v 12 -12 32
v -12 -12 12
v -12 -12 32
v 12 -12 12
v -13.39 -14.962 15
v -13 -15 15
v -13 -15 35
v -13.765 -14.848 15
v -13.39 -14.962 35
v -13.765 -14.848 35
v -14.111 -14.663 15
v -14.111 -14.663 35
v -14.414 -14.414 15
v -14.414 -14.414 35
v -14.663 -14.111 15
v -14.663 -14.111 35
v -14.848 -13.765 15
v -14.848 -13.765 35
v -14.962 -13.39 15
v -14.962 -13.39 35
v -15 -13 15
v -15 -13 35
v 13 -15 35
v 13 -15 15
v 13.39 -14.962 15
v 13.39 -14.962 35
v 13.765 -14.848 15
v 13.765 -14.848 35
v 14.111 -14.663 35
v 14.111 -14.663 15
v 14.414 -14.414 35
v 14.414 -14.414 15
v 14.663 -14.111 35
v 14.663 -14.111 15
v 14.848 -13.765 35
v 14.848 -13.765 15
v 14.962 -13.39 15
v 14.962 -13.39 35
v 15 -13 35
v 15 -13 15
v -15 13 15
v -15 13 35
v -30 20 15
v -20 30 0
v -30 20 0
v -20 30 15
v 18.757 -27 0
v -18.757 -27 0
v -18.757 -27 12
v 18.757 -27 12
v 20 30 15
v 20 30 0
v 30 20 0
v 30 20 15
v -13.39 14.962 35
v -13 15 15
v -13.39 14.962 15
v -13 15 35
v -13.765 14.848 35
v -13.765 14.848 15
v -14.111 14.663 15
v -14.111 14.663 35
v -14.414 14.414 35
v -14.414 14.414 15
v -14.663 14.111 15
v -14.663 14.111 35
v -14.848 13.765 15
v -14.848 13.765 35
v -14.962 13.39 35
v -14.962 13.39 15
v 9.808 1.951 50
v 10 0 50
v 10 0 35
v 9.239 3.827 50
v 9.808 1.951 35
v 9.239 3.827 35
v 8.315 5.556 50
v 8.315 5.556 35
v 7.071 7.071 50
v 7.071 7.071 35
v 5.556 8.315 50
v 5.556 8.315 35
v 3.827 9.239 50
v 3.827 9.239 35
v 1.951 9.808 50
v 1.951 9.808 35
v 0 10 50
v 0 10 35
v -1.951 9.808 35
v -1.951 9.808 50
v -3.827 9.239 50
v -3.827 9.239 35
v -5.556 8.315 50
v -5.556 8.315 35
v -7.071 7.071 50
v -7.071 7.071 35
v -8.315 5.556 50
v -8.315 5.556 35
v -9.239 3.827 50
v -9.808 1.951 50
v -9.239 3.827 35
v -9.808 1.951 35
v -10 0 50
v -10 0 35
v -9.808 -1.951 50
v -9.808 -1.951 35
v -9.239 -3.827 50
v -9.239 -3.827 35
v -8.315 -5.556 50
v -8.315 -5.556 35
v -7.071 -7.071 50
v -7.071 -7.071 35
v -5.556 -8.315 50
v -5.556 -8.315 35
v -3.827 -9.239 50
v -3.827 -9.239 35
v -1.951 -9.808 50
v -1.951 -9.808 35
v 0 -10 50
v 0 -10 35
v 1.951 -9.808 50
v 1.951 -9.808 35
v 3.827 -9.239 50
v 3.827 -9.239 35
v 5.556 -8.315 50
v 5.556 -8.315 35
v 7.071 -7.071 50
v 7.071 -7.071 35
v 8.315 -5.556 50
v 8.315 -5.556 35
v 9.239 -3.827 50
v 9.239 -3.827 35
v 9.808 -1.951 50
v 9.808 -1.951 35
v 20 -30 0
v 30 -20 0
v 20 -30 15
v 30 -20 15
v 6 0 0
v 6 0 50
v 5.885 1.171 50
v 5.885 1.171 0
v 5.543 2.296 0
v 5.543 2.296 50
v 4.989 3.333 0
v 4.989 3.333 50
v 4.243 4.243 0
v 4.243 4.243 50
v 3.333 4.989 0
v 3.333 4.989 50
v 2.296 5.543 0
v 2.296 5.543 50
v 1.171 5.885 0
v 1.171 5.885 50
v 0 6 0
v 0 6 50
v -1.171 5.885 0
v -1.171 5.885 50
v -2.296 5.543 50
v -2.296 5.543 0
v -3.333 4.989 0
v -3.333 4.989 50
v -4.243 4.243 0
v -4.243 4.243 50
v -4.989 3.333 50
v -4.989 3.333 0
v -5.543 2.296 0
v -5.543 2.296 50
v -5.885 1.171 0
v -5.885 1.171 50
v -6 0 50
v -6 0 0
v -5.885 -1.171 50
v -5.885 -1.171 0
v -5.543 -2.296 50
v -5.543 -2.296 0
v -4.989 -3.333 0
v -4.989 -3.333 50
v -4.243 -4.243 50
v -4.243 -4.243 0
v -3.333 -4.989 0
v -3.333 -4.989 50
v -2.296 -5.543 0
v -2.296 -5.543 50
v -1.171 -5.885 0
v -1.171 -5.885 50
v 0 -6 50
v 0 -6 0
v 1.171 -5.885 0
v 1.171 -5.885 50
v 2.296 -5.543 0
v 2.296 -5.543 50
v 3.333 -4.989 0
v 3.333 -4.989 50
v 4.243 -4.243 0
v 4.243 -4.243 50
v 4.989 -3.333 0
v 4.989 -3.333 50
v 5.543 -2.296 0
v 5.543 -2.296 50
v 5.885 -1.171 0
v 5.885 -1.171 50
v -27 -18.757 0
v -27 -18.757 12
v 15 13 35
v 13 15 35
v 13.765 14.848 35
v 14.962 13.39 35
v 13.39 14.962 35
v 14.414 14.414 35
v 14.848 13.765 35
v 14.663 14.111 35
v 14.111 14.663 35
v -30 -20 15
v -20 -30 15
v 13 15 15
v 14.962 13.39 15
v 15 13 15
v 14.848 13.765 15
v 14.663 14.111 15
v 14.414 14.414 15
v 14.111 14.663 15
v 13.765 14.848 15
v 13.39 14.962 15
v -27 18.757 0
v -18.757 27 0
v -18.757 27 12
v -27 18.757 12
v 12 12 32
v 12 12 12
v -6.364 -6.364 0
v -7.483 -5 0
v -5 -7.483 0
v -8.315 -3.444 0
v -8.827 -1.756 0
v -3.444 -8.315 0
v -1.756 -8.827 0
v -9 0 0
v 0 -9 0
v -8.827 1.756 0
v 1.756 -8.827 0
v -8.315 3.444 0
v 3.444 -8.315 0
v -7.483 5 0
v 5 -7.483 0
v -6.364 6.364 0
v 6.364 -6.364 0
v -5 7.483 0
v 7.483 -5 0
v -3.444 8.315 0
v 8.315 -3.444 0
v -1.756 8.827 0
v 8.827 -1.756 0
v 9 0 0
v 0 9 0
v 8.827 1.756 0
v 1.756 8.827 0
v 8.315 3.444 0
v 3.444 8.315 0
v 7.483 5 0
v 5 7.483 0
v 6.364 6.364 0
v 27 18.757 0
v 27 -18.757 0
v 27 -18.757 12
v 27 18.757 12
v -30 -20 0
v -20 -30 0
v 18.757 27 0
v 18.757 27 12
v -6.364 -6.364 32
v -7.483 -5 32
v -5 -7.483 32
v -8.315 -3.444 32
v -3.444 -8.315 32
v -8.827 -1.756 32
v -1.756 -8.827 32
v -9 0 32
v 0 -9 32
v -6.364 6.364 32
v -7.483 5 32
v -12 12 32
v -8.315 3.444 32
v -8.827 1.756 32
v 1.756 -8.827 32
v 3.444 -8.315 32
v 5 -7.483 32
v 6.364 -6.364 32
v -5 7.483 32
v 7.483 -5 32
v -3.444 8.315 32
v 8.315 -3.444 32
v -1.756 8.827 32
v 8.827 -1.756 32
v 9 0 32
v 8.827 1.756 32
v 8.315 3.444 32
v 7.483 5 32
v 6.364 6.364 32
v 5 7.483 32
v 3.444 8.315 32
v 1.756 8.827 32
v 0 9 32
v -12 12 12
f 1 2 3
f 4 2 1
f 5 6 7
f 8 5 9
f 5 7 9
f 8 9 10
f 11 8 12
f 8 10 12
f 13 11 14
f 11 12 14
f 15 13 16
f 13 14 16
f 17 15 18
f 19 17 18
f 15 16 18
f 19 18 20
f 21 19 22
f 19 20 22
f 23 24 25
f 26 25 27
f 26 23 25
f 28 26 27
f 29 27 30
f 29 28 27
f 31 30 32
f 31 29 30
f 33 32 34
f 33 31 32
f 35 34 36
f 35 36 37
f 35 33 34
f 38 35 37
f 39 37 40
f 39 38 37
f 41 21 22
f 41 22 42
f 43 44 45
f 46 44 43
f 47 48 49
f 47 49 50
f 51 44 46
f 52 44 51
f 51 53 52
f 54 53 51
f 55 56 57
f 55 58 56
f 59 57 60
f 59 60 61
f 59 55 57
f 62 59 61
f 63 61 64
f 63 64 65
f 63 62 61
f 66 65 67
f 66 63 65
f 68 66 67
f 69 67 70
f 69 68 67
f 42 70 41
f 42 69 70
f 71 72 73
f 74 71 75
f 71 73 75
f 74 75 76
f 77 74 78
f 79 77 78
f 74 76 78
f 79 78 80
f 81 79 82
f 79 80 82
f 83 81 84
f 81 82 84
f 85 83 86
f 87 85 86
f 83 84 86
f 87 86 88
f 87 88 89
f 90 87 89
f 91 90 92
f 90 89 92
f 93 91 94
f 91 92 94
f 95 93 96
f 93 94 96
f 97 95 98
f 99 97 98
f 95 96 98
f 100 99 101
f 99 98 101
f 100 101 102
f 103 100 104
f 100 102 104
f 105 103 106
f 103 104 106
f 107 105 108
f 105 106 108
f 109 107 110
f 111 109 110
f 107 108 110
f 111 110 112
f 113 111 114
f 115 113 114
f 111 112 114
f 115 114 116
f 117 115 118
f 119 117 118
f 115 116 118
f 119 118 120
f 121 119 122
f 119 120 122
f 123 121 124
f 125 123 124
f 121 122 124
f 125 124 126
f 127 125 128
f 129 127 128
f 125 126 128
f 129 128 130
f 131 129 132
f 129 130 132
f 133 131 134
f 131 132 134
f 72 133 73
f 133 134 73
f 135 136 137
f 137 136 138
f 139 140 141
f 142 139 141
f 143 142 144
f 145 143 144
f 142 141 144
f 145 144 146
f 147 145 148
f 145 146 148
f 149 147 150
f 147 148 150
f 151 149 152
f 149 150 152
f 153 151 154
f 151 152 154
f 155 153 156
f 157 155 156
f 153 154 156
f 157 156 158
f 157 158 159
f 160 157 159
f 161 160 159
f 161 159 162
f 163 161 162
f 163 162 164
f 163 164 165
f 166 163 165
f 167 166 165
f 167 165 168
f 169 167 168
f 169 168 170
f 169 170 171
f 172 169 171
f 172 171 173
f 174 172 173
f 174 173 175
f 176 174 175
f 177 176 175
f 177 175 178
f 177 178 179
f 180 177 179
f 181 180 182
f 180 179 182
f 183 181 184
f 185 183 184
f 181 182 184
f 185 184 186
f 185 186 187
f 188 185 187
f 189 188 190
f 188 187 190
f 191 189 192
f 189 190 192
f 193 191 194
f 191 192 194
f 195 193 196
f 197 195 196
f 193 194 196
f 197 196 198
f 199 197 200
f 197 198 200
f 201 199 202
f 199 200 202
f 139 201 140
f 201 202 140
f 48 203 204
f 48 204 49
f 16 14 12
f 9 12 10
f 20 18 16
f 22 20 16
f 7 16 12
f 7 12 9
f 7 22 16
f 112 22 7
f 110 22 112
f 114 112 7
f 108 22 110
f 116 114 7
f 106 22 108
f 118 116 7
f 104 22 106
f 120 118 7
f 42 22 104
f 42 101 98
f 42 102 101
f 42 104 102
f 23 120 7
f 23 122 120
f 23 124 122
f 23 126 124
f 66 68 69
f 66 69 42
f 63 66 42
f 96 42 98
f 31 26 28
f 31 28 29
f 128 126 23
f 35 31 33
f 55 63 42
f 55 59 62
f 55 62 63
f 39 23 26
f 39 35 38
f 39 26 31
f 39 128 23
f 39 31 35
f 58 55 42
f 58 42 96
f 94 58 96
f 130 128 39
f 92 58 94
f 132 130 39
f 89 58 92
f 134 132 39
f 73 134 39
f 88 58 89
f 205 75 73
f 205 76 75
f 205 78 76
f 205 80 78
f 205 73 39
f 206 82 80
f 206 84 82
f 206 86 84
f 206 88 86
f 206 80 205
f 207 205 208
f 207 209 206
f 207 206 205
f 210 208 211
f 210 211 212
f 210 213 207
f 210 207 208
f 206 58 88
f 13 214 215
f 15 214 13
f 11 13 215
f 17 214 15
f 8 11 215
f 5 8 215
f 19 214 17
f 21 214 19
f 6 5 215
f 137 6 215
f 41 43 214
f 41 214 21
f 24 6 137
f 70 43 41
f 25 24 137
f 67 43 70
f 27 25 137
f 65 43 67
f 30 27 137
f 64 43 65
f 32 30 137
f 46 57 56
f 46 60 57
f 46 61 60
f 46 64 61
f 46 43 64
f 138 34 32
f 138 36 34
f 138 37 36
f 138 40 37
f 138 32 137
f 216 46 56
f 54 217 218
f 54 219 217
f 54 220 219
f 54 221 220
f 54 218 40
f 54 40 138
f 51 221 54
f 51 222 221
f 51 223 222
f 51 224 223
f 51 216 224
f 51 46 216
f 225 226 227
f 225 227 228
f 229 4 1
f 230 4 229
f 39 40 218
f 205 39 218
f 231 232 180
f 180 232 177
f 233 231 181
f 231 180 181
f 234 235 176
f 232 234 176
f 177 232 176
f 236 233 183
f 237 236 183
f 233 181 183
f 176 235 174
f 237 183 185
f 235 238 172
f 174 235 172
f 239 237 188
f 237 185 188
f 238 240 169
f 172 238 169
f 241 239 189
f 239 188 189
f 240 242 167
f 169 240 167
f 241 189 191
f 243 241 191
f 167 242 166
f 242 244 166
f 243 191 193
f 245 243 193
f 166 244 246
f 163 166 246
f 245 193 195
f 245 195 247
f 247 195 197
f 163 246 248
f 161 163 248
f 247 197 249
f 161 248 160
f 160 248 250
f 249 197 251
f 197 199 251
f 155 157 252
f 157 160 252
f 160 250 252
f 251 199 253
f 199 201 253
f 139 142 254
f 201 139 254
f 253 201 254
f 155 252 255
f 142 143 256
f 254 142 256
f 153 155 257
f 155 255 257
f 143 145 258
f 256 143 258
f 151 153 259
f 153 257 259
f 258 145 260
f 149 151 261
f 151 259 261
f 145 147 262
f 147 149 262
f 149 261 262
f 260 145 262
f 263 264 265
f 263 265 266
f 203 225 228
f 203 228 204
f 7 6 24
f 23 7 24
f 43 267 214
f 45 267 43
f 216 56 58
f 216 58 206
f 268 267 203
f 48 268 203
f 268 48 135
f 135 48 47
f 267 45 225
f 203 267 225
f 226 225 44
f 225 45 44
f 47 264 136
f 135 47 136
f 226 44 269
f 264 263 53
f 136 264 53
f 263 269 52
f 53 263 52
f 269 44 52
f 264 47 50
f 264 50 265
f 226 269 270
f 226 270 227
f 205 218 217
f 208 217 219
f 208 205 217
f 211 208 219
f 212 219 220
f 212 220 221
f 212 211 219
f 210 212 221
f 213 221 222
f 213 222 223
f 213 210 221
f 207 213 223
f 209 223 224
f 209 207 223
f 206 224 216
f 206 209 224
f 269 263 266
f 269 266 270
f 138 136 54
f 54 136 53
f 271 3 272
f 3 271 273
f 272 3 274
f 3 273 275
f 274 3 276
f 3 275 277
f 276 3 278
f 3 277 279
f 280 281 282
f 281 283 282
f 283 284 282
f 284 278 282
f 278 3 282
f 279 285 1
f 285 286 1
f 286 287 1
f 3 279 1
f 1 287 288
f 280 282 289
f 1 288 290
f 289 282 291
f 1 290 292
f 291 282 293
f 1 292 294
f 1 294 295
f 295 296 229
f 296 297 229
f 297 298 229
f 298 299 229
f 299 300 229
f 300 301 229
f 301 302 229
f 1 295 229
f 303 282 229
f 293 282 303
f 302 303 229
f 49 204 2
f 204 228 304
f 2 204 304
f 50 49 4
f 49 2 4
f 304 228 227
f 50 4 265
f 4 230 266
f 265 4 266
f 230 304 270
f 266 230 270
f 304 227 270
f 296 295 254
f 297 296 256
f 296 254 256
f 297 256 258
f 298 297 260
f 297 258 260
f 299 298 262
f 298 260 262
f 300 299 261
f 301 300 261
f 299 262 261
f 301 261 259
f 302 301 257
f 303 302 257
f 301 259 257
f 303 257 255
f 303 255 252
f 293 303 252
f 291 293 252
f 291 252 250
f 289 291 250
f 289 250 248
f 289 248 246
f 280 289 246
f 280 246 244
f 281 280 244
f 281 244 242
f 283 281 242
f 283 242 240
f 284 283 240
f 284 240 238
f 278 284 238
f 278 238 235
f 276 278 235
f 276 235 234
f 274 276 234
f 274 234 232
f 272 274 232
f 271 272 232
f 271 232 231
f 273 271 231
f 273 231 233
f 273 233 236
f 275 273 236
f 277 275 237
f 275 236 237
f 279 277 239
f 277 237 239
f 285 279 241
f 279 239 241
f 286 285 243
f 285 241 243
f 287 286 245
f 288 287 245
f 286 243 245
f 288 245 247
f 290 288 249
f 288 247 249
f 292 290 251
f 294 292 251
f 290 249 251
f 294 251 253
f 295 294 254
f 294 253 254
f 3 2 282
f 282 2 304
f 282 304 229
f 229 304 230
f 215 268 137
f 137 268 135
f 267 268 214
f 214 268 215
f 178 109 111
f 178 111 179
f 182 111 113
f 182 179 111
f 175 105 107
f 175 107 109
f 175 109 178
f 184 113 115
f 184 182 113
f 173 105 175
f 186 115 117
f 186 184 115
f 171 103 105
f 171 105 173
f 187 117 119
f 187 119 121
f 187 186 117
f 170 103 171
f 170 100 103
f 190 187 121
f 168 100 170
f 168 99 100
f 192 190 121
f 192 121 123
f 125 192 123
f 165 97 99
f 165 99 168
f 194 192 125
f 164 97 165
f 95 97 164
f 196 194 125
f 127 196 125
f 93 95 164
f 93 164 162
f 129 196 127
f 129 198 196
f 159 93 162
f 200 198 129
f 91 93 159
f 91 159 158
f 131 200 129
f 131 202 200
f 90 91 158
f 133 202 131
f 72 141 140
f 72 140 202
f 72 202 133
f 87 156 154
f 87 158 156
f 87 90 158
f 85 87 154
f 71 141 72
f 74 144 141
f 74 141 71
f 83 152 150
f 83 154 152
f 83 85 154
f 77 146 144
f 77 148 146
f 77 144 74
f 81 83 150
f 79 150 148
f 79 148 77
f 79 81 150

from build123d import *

# Parameters (mm, degrees)
SKETCH1_W           = 60
SKETCH1_H           = 60
BOSS_EXTRUDE1_DEPTH = 15
SKETCH2_W           = 30
SKETCH2_H           = 30
BOSS_EXTRUDE2_DEPTH = 20
SKETCH3_R           = 10
BOSS_EXTRUDE3_DEPTH = 15
SKETCH4_R           = 6
CUT_EXTRUDE1_DEPTH  = 66.574385243
CHAMFER1_SIZE       = 10
FILLET1_R           = 2
SHELL1_T            = -3


with BuildPart() as part:
    # Sketch1 → Boss-Extrude1 (new body)
    with BuildSketch(Plane.XY):
        Rectangle(SKETCH1_W, SKETCH1_H)
    extrude(amount=BOSS_EXTRUDE1_DEPTH)

    # Sketch2 → Boss-Extrude2 (add)
    with BuildSketch(Plane.XY.offset(15)):
        Rectangle(SKETCH2_W, SKETCH2_H)
    extrude(amount=BOSS_EXTRUDE2_DEPTH)

    # Sketch3 → Boss-Extrude3 (add)
    with BuildSketch(Plane.XY.offset(35)):
        Circle(SKETCH3_R)
    extrude(amount=BOSS_EXTRUDE3_DEPTH)

    # Sketch4 → Cut-Extrude1 (cut, through all)
    with BuildSketch(Plane.XY.offset(50)):
        Circle(SKETCH4_R)
    extrude(amount=-CUT_EXTRUDE1_DEPTH, mode=Mode.SUBTRACT)

    # Chamfer1
    chamfer1_edges = [part.edges().sort_by_distance(p)[0] for p in [
        (30, 30, 7.5),
        (30, -30, 7.5),
        (-30, -30, 7.5),
        (-30, 30, 7.5),
    ]]
    chamfer(chamfer1_edges, length=CHAMFER1_SIZE)

    # Fillet1
    fillet1_edges = [part.edges().sort_by_distance(p)[0] for p in [
        (15, -15, 25),
        (15, 15, 25),
        (-15, 15, 25),
        (-15, -15, 25),
    ]]
    fillet(fillet1_edges, radius=FILLET1_R)

    # Shell1
    shell1_openings = [part.faces().sort_by_distance(p)[0] for p in [
        (0, 29.151471863, 0),
    ]]
    offset(amount=SHELL1_T, openings=shell1_openings, kind=Kind.INTERSECTION)


solid = part.part
